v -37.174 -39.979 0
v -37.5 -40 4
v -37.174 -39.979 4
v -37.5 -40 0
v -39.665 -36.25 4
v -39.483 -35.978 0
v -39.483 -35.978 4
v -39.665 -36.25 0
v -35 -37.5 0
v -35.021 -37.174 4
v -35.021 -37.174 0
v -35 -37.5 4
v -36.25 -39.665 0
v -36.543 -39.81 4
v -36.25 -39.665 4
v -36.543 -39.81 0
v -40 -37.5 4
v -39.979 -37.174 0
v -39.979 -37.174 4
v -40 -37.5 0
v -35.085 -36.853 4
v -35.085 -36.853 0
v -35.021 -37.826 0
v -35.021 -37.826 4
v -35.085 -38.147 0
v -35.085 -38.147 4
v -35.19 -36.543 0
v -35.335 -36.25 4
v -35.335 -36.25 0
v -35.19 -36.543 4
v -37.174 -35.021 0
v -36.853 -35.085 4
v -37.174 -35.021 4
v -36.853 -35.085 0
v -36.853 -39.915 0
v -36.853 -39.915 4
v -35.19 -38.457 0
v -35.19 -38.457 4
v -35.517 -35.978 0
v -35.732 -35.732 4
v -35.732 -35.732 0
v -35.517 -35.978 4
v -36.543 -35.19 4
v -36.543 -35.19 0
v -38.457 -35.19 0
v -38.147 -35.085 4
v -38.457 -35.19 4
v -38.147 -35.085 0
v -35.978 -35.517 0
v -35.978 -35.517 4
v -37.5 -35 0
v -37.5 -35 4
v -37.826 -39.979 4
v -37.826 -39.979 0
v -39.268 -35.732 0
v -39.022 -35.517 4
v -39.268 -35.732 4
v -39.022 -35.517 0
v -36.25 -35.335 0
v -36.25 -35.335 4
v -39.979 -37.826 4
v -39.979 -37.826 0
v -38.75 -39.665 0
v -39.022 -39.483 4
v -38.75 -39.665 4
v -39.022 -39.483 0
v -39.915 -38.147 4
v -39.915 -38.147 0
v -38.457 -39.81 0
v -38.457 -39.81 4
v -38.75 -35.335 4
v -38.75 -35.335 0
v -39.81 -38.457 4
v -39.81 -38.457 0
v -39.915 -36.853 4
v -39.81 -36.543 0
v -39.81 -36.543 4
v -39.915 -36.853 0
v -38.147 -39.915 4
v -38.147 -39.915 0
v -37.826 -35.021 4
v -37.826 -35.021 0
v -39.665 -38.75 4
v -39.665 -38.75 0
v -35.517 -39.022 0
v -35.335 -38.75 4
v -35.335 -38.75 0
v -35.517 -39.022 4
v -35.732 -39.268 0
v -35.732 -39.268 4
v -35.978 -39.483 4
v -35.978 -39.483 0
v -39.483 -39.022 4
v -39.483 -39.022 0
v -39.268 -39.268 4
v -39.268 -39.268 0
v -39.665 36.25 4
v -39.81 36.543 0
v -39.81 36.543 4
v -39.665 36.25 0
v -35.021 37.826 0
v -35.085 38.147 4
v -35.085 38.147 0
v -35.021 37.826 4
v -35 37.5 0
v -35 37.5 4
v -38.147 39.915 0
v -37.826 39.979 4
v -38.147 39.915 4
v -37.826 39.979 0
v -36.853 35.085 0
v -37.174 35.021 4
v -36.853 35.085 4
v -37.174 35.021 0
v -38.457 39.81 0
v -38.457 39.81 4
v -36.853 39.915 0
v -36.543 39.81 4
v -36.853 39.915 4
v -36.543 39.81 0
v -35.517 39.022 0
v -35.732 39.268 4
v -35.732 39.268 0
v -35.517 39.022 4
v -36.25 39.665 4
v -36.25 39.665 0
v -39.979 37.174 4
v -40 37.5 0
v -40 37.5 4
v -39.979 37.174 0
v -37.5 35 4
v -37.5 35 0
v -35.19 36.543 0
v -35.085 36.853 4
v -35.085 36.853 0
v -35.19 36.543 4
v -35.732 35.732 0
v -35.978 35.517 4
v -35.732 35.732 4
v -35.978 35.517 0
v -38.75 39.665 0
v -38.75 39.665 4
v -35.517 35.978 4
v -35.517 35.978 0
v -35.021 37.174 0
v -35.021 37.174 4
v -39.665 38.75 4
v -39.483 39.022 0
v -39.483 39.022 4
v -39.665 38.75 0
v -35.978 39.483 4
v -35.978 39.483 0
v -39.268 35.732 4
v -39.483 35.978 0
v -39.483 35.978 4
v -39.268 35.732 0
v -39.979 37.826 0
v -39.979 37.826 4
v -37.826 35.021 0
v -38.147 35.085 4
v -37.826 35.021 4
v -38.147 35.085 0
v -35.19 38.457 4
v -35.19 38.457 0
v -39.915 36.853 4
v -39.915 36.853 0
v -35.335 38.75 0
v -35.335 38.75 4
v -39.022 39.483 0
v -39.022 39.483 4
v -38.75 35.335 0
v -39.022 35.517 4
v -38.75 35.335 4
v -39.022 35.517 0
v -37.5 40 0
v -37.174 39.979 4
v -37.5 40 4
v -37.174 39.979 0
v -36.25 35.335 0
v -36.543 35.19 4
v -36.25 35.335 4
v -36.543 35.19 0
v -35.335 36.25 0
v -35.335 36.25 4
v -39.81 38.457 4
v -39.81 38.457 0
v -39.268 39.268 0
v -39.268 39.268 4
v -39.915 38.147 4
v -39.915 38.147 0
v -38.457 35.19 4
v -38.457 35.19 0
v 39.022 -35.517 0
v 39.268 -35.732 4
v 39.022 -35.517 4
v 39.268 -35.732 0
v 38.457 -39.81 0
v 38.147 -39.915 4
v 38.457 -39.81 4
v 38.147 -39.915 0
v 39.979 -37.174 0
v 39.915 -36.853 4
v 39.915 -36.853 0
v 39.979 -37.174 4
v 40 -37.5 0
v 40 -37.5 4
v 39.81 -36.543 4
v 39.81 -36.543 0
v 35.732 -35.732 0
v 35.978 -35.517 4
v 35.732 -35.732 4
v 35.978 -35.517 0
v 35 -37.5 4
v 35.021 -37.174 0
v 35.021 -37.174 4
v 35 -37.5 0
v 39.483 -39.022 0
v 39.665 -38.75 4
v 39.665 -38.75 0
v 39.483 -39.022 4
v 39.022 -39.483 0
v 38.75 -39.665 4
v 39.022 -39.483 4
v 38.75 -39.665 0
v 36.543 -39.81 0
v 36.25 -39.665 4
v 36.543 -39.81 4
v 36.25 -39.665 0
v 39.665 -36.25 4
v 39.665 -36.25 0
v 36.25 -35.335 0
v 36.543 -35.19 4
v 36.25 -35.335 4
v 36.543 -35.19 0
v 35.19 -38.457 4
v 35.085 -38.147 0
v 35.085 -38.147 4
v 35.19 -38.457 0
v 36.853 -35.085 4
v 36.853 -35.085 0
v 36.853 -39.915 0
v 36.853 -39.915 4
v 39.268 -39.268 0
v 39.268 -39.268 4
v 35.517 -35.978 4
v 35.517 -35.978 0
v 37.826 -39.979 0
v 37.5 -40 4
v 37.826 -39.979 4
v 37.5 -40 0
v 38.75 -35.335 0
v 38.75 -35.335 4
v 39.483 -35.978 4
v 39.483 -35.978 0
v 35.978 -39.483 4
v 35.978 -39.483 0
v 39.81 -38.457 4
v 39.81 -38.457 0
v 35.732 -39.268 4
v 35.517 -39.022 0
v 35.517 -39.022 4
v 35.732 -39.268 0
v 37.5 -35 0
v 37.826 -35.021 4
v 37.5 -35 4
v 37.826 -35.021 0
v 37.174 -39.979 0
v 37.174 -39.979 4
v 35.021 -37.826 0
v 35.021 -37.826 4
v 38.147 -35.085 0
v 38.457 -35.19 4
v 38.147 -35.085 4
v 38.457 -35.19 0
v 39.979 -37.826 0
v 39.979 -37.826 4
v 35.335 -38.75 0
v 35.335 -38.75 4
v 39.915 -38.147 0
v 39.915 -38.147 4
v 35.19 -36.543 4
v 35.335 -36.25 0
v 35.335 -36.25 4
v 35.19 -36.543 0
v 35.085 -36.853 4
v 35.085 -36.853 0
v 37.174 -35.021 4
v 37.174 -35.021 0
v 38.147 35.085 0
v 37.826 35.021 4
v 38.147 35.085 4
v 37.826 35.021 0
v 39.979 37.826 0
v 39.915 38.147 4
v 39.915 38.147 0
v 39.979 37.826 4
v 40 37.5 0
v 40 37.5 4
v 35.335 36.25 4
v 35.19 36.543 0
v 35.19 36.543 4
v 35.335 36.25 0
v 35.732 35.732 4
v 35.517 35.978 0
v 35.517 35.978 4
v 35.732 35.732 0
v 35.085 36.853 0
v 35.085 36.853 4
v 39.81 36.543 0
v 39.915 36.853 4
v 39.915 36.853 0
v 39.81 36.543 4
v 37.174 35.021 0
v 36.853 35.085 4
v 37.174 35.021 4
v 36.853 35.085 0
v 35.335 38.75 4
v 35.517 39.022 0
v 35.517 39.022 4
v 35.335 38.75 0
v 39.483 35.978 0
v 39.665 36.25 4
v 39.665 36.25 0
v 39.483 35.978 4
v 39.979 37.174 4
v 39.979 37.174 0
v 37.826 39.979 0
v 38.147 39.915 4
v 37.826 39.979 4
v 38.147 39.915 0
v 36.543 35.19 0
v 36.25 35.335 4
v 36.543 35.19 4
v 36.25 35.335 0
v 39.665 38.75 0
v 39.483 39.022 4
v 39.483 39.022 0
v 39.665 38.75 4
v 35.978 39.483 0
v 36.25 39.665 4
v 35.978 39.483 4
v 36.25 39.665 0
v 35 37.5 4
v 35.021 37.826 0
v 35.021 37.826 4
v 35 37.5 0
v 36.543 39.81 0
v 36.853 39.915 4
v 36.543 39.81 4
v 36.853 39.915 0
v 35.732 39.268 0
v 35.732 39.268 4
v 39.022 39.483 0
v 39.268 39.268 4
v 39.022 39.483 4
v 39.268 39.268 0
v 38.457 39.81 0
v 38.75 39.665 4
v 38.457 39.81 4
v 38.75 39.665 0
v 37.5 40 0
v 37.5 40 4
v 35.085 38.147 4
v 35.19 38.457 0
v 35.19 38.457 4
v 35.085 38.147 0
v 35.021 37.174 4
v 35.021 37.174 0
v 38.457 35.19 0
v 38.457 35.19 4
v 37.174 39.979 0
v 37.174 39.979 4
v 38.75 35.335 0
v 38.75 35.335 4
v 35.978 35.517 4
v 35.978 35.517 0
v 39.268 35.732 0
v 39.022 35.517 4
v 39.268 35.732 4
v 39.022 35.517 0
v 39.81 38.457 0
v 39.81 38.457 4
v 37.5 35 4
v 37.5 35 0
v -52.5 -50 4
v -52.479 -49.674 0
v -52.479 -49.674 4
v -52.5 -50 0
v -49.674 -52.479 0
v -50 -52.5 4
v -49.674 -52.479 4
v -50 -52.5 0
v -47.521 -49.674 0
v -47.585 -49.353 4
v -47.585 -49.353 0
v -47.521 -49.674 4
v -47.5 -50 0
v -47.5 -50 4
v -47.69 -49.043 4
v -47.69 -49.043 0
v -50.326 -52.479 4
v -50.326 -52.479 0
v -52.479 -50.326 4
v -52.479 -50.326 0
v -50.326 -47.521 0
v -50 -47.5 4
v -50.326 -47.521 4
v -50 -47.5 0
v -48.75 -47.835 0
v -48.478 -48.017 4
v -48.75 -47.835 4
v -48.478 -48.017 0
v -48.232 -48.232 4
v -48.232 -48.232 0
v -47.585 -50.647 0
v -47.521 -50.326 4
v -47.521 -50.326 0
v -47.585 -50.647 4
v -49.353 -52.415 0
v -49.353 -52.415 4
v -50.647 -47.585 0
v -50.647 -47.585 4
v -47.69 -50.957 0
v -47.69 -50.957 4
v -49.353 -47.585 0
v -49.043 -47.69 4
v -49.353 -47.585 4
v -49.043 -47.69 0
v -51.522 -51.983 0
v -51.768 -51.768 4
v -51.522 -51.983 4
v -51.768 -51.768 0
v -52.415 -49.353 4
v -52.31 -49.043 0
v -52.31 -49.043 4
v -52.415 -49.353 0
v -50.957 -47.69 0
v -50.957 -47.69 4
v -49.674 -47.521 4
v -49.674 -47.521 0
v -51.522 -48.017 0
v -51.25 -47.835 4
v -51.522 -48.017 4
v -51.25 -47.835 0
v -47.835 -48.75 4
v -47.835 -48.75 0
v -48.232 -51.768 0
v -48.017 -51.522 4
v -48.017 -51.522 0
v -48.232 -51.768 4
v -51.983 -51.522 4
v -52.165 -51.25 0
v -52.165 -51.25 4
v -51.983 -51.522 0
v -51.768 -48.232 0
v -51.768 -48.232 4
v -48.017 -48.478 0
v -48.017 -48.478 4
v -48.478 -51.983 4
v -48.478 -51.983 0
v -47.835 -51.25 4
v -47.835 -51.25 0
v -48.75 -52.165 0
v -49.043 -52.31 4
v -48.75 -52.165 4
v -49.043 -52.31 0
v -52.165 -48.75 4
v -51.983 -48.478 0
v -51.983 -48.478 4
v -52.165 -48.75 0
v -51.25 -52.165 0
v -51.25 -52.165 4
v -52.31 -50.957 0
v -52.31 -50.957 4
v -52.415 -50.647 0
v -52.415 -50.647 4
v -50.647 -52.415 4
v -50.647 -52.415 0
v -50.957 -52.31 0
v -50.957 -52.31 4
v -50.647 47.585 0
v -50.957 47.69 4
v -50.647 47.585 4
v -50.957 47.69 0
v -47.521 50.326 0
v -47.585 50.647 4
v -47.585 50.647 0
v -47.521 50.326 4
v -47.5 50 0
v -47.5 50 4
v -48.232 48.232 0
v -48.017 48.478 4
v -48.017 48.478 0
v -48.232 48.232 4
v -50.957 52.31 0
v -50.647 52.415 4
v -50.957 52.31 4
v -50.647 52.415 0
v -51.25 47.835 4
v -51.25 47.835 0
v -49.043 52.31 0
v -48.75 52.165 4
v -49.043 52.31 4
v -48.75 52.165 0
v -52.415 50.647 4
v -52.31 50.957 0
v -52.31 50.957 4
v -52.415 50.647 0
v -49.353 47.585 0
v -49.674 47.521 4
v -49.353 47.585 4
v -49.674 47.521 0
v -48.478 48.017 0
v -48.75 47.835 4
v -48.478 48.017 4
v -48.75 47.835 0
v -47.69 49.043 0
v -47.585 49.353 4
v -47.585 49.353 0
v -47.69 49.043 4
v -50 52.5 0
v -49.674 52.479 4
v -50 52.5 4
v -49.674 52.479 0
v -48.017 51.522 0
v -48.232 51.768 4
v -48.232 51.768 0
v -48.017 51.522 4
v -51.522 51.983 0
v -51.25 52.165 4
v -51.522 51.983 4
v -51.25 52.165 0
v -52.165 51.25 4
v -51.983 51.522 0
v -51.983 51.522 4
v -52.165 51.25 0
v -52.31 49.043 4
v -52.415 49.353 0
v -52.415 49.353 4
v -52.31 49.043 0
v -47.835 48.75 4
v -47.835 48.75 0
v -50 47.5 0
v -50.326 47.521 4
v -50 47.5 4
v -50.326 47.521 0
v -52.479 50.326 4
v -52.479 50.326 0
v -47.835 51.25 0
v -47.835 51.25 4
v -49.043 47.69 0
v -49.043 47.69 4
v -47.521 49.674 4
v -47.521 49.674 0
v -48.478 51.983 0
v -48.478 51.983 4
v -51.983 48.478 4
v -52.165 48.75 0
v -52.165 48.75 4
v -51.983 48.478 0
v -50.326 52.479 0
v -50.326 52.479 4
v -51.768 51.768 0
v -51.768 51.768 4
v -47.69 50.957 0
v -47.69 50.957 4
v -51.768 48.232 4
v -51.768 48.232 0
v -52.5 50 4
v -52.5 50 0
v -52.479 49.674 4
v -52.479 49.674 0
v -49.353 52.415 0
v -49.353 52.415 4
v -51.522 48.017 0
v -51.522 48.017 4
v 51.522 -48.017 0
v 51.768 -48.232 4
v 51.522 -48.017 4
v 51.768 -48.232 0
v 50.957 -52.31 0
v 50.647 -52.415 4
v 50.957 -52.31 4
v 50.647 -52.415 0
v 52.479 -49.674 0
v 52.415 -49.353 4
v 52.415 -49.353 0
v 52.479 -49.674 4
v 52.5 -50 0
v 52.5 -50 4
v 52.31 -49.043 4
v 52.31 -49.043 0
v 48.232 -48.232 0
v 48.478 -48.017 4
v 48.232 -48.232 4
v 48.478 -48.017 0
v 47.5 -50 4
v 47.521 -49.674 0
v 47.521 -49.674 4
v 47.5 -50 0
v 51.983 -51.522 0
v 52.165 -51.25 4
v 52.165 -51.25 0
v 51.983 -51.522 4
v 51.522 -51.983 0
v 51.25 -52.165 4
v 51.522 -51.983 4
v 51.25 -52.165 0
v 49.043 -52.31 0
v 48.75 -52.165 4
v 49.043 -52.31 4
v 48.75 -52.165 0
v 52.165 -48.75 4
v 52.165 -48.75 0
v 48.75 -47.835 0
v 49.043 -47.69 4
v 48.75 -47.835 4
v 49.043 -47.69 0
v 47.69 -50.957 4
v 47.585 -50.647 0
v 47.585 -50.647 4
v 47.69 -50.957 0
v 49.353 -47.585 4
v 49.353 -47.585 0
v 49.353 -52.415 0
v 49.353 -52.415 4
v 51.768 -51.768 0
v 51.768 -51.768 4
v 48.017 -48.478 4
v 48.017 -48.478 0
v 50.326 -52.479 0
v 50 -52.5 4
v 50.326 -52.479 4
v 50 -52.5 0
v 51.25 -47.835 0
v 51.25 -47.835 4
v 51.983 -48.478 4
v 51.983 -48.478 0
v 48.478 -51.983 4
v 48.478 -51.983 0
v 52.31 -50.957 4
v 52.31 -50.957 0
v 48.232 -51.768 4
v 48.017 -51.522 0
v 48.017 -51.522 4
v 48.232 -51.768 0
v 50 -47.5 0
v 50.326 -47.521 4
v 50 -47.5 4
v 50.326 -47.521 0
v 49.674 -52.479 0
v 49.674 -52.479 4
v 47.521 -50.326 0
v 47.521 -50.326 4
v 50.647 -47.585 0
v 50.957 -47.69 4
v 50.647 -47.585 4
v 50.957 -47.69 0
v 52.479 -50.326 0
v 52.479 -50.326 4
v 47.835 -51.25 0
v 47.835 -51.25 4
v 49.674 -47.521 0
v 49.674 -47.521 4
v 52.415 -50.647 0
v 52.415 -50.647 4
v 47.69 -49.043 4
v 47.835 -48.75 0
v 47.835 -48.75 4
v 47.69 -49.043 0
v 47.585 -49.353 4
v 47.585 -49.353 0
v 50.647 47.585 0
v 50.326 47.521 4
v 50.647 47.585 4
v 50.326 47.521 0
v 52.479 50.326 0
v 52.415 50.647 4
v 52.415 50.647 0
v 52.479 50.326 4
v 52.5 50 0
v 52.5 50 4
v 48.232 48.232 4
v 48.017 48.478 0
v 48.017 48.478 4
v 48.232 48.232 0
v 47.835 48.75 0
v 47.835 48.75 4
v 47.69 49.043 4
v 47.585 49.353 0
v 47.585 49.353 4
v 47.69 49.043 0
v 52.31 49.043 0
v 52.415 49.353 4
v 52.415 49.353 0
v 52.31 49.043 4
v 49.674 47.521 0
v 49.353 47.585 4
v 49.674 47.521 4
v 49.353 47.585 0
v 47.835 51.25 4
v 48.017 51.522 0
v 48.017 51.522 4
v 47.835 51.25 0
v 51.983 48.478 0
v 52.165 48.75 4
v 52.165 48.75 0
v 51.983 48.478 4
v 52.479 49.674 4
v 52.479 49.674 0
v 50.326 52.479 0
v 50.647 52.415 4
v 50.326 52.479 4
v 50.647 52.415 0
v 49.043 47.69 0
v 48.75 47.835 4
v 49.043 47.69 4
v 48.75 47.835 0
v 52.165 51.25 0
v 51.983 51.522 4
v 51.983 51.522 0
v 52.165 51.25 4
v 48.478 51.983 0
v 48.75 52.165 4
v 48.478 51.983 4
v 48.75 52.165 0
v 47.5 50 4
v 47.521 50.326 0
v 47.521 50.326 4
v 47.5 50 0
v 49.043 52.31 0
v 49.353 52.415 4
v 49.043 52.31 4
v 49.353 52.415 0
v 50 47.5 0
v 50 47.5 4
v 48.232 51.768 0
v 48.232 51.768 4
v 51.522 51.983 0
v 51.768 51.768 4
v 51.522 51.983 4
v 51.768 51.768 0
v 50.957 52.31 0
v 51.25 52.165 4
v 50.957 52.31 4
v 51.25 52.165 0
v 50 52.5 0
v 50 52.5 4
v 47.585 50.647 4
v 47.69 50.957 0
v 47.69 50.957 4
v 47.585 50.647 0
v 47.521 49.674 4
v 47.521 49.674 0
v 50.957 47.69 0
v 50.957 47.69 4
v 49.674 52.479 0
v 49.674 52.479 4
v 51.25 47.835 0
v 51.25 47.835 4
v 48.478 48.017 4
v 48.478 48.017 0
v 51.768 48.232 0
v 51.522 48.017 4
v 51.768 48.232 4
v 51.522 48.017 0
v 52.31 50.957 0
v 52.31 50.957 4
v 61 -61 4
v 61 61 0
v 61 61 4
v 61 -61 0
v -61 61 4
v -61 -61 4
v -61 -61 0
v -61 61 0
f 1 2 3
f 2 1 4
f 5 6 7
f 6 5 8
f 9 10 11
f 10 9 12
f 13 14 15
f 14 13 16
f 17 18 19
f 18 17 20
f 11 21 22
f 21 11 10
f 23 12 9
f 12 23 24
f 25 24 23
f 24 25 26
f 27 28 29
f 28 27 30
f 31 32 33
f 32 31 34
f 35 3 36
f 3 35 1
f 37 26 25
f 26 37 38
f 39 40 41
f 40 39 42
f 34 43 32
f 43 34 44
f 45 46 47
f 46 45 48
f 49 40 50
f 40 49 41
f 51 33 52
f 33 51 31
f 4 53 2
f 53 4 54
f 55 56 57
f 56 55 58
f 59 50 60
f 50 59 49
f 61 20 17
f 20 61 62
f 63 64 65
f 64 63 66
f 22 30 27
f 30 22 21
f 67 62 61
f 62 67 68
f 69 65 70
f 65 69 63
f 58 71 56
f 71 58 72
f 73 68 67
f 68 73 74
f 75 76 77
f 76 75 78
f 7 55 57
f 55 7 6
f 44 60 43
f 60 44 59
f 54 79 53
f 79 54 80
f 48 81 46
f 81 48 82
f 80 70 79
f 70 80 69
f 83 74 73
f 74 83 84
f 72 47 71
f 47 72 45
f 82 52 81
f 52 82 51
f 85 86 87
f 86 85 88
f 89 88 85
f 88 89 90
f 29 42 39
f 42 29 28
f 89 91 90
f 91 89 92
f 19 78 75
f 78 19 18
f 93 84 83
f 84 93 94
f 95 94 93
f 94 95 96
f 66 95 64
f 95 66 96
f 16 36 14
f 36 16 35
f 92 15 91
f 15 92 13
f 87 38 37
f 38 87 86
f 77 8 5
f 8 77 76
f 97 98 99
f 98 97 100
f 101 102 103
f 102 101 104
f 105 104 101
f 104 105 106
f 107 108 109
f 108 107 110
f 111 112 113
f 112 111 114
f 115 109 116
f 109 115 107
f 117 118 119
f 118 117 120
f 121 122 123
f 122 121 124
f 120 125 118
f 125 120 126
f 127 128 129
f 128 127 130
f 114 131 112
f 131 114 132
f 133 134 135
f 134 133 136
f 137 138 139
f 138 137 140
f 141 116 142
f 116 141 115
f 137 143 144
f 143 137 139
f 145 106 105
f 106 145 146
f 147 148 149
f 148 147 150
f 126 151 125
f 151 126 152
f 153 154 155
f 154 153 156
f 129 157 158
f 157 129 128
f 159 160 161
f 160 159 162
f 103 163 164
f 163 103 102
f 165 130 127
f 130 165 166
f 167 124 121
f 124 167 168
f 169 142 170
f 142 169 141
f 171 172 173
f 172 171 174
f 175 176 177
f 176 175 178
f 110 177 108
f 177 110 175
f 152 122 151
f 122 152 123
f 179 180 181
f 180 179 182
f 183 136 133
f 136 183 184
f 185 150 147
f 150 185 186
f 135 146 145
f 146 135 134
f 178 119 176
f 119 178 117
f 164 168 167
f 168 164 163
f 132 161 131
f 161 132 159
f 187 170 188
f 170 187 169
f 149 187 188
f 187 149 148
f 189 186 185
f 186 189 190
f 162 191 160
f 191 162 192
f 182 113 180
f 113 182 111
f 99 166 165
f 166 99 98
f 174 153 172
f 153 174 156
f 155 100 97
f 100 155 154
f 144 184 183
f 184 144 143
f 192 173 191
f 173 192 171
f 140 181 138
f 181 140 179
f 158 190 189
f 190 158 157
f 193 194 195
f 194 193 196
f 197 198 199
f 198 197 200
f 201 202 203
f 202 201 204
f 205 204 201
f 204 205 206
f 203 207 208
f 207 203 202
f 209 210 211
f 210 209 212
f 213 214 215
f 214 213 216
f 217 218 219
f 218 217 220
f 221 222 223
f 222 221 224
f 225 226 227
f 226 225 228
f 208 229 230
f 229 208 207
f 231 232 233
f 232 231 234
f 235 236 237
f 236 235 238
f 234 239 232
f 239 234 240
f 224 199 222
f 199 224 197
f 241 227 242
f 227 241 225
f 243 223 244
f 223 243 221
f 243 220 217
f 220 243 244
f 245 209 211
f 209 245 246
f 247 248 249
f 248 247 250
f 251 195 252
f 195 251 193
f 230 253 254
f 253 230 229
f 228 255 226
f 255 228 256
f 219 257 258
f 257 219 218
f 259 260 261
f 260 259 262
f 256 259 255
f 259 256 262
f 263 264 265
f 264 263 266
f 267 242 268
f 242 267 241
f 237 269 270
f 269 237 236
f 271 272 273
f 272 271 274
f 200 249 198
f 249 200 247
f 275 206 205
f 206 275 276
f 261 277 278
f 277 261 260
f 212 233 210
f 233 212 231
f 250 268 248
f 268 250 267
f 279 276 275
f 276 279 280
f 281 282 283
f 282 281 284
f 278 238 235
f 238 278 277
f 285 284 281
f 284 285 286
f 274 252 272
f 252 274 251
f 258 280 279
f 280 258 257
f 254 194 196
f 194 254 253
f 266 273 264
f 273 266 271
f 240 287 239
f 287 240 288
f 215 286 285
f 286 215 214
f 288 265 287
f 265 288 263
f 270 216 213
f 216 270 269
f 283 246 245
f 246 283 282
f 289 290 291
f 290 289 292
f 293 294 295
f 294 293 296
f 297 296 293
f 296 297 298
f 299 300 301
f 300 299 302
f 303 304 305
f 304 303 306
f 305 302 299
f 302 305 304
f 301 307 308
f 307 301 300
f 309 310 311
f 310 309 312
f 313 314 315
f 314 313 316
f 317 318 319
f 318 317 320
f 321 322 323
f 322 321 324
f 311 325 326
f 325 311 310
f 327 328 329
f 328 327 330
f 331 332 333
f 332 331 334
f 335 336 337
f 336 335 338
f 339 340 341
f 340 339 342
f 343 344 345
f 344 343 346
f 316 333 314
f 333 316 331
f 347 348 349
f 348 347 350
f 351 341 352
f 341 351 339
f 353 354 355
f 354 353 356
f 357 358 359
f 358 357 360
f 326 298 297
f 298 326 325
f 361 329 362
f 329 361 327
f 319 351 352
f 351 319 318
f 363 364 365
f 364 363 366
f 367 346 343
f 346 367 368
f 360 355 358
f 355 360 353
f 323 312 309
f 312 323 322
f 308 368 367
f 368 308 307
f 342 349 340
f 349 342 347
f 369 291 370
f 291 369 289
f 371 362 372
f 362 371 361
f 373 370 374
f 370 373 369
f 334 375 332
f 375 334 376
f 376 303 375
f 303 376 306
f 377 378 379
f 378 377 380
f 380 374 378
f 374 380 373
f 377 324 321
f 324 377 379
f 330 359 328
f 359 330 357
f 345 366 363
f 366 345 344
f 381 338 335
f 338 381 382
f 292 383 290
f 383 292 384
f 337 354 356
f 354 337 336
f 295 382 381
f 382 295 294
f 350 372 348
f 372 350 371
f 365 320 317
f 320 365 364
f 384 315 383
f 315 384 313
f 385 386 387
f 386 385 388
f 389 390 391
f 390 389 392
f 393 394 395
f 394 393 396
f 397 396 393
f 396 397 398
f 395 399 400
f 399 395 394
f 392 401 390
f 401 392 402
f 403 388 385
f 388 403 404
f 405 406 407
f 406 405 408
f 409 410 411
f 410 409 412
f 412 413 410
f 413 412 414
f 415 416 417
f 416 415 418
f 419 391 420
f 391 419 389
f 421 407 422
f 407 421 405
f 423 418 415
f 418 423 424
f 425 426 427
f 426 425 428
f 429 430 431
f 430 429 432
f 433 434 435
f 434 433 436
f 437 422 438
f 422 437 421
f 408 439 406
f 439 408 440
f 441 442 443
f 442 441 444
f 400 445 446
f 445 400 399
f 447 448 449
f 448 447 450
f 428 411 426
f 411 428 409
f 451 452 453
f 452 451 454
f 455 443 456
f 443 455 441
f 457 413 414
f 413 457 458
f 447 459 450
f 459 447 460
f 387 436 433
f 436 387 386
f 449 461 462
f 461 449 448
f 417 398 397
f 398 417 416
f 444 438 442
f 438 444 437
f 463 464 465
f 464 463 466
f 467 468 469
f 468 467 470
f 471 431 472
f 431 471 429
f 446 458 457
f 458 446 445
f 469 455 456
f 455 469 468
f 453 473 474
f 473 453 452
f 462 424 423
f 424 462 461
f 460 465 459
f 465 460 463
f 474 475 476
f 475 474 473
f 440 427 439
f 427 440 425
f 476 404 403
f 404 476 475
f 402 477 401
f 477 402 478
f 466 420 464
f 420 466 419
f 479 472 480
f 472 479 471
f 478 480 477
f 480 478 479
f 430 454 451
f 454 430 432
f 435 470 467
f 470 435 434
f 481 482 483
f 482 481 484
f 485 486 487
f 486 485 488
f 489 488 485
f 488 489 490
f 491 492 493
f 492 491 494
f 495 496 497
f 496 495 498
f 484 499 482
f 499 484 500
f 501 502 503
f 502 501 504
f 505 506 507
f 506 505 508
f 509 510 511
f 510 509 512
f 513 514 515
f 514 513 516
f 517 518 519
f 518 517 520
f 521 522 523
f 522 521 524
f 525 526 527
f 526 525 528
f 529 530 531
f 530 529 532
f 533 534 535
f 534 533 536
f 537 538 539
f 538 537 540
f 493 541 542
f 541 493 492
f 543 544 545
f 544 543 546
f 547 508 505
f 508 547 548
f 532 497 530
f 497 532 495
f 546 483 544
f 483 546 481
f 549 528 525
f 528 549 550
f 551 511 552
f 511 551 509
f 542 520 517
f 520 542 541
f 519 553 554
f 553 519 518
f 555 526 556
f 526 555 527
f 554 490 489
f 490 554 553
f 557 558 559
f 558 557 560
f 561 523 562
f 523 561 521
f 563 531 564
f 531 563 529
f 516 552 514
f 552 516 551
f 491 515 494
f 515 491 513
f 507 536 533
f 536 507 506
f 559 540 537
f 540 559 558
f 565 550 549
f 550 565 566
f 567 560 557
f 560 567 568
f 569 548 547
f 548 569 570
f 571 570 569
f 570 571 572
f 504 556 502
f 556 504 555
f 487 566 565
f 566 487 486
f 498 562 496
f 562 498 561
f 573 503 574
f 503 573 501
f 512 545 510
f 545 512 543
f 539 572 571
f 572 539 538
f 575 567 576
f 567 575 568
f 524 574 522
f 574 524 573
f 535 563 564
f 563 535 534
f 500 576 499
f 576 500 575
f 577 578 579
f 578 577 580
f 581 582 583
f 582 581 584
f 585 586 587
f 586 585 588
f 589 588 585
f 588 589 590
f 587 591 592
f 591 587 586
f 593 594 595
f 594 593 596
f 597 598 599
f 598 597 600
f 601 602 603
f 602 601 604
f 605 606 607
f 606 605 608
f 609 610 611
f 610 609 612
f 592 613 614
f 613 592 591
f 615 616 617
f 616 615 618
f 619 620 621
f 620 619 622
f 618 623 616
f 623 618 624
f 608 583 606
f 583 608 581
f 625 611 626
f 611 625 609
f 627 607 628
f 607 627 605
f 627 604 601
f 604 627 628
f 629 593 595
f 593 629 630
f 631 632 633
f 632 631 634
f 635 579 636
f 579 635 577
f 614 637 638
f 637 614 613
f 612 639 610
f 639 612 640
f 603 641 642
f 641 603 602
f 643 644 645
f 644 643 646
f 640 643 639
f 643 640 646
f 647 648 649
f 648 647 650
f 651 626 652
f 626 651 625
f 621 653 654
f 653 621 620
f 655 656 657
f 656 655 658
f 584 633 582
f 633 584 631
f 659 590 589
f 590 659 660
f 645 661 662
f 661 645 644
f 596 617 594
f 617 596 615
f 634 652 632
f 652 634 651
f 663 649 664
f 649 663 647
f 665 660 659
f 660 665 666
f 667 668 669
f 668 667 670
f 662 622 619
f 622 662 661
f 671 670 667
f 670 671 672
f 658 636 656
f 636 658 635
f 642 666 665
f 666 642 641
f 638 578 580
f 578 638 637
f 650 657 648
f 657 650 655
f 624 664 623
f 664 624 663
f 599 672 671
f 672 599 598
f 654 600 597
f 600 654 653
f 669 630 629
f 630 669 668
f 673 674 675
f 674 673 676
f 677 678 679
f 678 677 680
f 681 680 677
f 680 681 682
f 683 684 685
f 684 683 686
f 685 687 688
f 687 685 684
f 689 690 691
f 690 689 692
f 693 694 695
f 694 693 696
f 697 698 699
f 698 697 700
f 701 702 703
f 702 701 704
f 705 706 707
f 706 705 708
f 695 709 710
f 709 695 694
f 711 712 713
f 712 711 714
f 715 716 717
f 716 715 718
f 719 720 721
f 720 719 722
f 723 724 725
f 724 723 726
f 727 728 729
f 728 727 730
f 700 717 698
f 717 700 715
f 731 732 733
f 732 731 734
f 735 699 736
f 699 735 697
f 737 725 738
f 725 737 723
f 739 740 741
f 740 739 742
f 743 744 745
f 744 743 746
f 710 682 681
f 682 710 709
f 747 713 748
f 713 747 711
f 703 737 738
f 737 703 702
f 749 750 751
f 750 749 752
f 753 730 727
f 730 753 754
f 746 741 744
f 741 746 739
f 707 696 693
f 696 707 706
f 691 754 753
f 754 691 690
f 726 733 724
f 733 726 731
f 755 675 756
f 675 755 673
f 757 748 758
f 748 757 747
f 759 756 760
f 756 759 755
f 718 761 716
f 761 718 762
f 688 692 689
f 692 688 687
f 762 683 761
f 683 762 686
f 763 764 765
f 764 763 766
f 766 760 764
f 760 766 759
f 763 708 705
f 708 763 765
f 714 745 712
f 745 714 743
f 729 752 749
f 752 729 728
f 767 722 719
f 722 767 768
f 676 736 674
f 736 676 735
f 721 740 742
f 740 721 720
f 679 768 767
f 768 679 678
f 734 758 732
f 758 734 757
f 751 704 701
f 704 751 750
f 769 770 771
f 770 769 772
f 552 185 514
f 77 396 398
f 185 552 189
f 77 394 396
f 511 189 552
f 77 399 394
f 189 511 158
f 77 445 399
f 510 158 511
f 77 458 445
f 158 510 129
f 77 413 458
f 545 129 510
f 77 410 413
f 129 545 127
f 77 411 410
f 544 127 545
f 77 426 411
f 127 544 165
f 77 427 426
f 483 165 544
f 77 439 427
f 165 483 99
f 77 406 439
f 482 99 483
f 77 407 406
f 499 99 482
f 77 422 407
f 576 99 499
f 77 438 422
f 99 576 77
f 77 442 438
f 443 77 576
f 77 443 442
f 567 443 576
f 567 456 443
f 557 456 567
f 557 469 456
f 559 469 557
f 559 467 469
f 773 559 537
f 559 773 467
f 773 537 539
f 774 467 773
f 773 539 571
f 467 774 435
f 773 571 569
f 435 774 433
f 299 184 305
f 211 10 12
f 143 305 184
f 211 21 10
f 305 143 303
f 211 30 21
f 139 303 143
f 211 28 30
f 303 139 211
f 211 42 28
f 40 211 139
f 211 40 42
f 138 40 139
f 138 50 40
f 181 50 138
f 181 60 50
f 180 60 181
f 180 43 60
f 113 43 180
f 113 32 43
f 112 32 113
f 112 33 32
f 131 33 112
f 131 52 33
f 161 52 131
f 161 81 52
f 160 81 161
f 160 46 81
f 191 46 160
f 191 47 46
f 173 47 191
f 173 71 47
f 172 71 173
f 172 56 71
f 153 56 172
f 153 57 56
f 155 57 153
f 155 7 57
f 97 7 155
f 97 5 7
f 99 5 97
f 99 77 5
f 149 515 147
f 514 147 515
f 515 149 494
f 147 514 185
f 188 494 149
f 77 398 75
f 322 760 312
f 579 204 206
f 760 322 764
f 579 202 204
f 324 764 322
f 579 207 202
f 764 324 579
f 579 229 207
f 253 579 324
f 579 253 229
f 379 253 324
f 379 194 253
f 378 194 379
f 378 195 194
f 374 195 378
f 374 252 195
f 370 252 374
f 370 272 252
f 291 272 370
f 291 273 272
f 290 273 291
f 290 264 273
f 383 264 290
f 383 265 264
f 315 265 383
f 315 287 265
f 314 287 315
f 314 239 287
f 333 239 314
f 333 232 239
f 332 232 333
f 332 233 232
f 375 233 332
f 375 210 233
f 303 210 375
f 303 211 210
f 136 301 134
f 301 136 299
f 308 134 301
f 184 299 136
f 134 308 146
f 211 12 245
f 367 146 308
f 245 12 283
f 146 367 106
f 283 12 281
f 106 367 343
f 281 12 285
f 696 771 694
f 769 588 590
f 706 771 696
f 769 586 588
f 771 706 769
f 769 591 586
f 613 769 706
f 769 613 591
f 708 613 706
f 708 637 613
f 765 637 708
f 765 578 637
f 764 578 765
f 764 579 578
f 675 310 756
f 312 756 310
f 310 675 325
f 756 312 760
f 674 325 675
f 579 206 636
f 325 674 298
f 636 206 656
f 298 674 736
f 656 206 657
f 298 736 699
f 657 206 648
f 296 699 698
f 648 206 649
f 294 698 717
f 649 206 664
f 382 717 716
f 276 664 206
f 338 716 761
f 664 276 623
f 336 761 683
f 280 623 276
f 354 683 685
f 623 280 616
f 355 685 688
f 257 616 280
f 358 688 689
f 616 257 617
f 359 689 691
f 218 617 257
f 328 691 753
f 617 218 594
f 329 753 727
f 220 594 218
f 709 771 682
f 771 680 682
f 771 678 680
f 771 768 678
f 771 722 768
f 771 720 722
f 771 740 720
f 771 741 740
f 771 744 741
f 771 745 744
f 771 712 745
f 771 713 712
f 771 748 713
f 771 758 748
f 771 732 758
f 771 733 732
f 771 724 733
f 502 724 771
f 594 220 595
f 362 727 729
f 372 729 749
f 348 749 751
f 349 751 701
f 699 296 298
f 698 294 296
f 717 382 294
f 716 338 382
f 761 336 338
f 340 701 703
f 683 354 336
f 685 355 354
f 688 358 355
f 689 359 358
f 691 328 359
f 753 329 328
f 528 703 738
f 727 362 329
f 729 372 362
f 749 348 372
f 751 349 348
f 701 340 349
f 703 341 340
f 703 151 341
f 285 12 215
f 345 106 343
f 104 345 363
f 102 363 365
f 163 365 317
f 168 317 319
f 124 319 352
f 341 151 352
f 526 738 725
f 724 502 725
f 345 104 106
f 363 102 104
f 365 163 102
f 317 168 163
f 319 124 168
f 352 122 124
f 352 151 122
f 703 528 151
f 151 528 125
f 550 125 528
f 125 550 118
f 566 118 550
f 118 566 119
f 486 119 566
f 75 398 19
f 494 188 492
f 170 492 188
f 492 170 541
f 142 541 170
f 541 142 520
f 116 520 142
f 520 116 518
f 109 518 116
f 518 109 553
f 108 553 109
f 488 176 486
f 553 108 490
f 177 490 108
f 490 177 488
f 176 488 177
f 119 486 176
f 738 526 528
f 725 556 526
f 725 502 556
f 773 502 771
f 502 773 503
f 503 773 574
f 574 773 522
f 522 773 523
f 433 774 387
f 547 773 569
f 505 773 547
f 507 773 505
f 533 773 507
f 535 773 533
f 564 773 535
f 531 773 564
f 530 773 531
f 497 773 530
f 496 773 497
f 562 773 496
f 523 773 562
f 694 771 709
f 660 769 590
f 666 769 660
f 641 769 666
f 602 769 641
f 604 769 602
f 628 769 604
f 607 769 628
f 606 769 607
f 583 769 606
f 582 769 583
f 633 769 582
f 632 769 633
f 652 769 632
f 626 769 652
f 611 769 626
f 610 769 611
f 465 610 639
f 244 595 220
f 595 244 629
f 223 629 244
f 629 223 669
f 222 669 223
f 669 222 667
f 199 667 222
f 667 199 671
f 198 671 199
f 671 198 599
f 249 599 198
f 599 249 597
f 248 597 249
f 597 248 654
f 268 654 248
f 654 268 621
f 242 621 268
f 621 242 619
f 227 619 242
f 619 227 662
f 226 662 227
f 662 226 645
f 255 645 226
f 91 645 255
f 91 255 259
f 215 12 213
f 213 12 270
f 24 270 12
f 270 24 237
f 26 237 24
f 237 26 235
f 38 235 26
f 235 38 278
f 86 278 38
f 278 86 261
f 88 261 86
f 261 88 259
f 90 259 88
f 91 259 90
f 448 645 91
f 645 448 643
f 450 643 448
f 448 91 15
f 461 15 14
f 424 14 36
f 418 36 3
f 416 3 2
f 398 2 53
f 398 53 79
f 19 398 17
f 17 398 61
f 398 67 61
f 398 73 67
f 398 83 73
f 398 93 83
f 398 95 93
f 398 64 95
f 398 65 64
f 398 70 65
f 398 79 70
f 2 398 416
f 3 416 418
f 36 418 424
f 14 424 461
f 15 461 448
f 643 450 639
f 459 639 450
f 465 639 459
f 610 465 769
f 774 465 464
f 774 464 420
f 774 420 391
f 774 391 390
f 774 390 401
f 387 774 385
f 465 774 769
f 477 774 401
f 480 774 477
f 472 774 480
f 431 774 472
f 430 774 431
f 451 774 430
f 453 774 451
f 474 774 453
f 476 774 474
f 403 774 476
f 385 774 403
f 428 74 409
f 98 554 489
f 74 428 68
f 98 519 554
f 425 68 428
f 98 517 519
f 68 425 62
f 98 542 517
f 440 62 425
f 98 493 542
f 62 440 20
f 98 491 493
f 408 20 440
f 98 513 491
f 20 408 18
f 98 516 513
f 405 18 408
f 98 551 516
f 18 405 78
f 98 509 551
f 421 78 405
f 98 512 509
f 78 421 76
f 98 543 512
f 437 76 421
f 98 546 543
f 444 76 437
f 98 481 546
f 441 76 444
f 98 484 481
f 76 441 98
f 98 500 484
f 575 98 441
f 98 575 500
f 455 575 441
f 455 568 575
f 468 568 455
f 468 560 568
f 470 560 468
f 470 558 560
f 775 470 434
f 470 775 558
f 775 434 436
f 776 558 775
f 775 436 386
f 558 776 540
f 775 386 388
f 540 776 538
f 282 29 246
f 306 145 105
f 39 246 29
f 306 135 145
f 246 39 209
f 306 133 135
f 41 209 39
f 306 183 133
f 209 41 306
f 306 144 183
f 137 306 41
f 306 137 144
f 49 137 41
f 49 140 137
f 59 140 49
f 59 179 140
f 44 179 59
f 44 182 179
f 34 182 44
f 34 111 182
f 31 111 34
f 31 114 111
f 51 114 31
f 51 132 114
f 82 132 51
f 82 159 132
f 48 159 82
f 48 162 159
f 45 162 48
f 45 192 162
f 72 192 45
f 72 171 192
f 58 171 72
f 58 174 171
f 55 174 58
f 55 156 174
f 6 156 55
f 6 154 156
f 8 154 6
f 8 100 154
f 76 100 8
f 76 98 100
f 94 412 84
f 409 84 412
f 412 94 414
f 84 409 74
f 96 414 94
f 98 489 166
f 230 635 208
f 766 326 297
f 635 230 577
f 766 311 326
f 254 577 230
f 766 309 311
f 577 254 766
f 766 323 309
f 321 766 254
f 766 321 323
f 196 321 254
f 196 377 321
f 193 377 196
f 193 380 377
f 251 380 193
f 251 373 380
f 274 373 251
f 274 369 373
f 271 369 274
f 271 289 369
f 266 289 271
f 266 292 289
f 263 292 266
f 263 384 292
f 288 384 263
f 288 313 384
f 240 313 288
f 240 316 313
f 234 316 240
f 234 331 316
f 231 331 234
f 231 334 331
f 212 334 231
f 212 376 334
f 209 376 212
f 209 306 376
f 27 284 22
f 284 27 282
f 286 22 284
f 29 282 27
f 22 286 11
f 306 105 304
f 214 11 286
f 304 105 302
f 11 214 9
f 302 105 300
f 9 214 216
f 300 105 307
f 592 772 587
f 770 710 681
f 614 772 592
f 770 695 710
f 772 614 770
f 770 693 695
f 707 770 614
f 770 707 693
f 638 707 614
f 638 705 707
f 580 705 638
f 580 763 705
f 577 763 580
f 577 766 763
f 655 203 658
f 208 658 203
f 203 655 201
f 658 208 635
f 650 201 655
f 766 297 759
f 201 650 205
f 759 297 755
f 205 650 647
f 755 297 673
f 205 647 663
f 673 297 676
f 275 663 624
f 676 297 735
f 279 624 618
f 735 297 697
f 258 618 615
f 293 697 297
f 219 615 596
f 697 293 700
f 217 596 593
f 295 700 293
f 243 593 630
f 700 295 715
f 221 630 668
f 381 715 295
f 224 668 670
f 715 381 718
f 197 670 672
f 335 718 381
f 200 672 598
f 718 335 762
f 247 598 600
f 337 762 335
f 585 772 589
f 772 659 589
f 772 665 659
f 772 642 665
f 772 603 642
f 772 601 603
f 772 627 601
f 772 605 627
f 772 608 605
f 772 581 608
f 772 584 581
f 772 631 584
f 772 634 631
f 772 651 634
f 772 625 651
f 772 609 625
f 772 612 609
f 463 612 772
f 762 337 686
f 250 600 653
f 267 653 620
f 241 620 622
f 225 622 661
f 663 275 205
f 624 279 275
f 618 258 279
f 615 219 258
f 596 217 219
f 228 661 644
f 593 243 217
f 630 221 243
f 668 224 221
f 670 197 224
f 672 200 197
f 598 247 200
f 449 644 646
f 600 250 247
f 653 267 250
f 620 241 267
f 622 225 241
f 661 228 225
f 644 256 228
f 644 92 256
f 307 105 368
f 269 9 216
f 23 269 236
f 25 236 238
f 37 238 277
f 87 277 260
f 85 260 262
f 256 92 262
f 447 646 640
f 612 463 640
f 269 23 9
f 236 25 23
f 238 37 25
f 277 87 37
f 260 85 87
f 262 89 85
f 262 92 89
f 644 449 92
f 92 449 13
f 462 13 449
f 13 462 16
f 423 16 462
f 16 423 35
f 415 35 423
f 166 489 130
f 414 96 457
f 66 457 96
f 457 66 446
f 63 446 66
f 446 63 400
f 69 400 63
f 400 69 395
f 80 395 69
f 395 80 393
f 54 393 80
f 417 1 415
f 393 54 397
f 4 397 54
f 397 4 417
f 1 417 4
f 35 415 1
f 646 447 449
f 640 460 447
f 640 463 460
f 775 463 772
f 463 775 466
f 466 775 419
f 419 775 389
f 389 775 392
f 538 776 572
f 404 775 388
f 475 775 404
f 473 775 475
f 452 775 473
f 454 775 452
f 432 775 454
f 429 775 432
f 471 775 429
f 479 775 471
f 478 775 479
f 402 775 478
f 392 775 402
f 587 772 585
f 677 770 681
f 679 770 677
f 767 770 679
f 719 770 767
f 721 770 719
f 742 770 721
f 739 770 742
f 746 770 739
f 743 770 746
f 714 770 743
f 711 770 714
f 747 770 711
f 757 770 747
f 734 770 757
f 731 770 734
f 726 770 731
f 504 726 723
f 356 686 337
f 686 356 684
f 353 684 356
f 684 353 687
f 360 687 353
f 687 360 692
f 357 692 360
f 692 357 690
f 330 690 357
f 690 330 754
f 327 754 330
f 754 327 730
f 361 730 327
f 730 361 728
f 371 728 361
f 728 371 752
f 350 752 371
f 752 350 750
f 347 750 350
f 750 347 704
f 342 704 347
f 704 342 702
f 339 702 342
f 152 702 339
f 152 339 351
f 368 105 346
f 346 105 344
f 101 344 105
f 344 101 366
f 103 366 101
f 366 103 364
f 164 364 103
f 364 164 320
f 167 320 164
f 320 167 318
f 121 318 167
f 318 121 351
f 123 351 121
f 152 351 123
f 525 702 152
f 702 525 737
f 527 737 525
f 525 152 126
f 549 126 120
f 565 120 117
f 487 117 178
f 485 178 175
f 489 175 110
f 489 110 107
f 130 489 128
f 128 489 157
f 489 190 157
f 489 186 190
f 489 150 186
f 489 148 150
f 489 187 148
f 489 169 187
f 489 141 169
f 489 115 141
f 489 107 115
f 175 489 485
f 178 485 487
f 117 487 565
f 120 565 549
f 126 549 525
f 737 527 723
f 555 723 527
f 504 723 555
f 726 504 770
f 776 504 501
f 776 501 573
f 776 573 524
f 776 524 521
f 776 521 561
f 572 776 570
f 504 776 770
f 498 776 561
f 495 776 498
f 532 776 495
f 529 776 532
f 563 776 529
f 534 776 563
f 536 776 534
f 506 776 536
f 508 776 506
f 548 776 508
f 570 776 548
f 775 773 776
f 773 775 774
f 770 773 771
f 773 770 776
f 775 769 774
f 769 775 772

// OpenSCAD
// VESA adapter plate - a flat plate carrying two square bolt patterns, to mount a display
// or bracket drilled for one VESA size onto another. NOVEL general mount.
//
// @desc VESA adapter plate linking two square bolt patterns
// @prompt Design a VESA adapter plate in OpenSCAD: a flat plate {thick} mm thick carrying a {src} by {src} mm square bolt pattern and a {dst} by {dst} mm square bolt pattern, with {hole} mm holes, to adapt one VESA mount to another. Reply with a single complete OpenSCAD file.
// @param src   source VESA pitch, mm     [50:200]
// @param dst   target VESA pitch, mm     [50:200]
// @param thick plate thickness, mm       [3:8]
// @param hole  bolt hole diameter, mm     [3:8]

src   = 75;
dst   = 100;
thick = 4;
hole  = 5;

$fn = 48;

size = max(src, dst) + 2 * hole + 12;

difference() {
    translate([-size / 2, -size / 2, 0]) cube([size, size, thick]);
    for (p = [src, dst])
        for (x = [-p / 2, p / 2])
            for (y = [-p / 2, p / 2])
                translate([x, y, -1]) cylinder(h = thick + 2, d = hole);
}
